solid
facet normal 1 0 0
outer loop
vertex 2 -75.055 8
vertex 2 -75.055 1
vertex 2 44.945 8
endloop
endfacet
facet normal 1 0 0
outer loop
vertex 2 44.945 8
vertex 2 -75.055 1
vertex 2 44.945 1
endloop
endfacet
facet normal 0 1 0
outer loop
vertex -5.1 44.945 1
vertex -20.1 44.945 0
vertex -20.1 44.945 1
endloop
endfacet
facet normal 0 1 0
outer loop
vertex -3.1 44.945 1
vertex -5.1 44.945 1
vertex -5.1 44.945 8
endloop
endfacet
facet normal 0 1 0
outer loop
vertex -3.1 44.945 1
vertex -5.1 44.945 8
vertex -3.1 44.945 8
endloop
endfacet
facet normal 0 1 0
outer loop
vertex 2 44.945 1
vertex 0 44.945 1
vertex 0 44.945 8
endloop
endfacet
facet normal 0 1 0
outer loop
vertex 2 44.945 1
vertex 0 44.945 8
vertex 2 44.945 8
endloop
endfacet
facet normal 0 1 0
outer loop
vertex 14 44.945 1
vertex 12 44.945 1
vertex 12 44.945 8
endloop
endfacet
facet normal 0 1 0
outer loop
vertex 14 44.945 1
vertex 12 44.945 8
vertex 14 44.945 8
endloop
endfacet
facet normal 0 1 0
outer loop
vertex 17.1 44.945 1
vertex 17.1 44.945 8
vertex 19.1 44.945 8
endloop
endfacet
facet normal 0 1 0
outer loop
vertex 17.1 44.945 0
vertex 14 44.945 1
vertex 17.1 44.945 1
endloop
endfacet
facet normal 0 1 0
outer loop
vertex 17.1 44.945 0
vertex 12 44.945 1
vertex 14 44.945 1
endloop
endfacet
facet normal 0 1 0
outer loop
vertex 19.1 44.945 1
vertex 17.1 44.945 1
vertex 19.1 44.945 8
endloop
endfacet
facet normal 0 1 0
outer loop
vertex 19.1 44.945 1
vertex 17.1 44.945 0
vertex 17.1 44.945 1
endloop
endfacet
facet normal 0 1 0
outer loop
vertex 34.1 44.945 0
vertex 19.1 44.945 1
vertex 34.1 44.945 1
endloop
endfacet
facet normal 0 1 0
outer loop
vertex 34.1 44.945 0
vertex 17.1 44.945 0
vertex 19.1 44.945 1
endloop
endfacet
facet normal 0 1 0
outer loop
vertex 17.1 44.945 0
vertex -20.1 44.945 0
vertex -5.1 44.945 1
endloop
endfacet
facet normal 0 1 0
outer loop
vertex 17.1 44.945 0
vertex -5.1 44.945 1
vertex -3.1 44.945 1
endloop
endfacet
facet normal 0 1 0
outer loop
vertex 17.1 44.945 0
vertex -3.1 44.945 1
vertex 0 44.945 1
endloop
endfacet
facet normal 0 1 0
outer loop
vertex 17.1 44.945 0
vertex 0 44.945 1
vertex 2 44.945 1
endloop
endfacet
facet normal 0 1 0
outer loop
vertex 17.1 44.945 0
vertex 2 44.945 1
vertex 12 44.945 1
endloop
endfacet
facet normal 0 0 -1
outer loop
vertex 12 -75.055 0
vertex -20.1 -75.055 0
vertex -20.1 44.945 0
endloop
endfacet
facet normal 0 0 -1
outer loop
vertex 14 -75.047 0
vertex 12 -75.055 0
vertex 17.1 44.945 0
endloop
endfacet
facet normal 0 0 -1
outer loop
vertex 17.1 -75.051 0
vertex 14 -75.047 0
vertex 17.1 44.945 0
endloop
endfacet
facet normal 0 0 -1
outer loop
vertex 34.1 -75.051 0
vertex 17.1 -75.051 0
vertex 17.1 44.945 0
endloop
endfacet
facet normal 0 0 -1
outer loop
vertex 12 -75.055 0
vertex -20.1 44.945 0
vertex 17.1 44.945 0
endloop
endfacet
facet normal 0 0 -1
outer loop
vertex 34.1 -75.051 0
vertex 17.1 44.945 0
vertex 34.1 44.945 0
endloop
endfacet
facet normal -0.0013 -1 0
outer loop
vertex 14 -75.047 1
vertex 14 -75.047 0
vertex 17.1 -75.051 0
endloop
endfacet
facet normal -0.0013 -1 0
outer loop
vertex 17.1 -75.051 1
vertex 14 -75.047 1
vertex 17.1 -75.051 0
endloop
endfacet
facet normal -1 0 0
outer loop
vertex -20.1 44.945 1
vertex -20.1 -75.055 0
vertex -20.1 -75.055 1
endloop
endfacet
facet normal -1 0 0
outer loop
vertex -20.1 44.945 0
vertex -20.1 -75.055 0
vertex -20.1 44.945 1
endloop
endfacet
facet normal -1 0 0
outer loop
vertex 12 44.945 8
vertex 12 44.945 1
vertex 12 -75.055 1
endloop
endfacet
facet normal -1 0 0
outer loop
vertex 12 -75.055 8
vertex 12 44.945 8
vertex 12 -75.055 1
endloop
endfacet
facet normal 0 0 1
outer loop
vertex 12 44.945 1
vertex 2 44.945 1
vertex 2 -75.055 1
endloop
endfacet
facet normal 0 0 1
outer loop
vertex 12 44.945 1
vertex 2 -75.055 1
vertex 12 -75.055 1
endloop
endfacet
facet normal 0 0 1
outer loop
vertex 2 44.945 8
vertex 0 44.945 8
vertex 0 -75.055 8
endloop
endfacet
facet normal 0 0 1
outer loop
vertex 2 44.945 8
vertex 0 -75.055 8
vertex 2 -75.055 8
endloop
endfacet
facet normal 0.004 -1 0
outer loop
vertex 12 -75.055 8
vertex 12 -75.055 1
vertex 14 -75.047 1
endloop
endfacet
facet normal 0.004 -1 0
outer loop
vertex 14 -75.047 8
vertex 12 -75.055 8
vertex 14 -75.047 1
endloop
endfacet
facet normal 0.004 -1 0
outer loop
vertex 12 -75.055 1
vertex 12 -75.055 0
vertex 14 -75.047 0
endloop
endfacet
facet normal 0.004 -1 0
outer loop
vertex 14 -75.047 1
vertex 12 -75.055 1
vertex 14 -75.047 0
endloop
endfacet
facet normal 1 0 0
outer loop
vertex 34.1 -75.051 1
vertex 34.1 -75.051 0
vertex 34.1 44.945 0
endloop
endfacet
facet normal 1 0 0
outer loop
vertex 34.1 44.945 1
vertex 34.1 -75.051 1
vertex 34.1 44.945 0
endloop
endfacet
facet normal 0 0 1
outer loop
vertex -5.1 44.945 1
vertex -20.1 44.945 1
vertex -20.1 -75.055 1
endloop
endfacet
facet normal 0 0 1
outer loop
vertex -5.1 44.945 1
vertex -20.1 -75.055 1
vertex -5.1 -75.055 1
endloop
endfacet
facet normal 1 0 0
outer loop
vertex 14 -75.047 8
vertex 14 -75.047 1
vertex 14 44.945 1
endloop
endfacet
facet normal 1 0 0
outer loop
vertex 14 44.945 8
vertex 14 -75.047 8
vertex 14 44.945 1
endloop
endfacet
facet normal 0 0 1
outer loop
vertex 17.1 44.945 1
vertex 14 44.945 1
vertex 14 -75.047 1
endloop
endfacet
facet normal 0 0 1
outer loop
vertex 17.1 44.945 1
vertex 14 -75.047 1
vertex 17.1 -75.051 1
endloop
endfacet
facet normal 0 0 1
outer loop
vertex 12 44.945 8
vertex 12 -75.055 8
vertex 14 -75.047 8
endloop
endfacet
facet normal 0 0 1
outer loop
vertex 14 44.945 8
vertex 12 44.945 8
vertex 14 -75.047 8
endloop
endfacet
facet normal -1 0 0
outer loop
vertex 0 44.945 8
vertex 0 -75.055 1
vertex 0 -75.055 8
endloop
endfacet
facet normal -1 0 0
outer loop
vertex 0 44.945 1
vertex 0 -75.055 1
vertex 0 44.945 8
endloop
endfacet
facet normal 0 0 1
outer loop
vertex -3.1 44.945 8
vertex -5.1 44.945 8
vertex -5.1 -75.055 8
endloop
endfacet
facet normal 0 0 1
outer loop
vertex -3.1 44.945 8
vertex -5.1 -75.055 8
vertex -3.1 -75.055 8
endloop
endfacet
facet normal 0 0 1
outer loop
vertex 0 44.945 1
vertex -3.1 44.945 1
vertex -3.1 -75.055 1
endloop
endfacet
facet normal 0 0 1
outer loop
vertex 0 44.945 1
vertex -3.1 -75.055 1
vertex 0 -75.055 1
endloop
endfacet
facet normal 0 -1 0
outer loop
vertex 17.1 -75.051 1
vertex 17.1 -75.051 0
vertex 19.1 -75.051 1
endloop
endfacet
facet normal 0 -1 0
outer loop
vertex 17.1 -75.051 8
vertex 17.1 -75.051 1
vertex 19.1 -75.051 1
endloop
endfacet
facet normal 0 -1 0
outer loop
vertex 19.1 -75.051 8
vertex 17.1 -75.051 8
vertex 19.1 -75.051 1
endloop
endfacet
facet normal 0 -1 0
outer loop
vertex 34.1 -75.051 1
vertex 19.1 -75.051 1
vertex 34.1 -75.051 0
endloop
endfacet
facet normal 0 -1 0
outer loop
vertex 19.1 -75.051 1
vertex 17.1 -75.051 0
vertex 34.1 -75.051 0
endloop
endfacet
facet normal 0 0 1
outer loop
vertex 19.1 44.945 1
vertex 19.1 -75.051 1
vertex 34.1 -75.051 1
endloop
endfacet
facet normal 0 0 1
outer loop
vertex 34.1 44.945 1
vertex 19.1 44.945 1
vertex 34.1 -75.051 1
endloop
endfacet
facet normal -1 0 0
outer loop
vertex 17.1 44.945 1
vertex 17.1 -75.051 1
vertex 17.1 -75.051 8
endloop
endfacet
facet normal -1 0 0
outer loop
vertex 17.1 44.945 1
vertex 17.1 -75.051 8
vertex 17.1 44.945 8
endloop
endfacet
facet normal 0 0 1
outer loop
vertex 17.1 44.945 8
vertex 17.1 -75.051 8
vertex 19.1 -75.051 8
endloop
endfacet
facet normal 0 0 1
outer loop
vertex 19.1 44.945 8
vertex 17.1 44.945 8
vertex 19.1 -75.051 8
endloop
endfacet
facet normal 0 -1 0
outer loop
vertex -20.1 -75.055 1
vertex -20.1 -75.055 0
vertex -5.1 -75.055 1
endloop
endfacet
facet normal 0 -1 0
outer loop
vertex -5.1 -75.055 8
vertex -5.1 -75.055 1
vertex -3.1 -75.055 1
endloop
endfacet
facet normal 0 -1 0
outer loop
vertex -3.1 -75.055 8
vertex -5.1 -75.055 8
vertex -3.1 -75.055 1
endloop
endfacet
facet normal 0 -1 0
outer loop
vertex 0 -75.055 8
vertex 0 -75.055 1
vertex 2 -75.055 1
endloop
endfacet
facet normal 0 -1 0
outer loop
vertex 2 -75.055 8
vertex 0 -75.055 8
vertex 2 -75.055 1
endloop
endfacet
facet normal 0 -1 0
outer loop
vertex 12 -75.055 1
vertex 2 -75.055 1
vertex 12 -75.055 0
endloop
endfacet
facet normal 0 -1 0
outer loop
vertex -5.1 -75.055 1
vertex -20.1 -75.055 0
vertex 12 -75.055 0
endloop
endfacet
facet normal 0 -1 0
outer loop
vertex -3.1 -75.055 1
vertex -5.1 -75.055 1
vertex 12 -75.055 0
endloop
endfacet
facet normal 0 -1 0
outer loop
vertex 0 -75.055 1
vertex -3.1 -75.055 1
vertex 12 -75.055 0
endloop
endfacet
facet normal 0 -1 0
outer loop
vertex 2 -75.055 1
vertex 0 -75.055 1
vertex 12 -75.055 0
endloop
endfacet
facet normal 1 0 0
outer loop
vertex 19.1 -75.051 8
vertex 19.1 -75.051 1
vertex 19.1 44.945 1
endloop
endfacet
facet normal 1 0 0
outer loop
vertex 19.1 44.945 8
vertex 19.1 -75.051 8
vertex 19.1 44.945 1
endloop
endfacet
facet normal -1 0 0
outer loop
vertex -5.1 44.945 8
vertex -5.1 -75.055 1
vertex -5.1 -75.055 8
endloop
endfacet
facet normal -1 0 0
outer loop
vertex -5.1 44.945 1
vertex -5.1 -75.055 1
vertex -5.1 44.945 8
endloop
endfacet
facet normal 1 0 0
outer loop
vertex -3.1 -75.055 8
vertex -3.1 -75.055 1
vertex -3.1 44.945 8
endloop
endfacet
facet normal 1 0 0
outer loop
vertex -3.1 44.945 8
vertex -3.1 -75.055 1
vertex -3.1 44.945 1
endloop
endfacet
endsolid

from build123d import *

# Parameters (mm, degrees)
F0_W     = 3.1
F0_H     = 120
F1_DEPTH = 1
F0_W_2   = 10
F0_W_3   = 15
F0_H_2   = 119.9958917713
F0_W_4   = 2
F2_DEPTH = 8


with BuildPart() as f1:
    # F0 (on Top) → F1 (new body)
    with BuildSketch(Plane.XY):
        with Locations((-1.55, -15.0552866608)):
            Rectangle(F0_W, F0_H)
    extrude(amount=F1_DEPTH)



with BuildPart() as f1b:
    # F0 (on Top) → F1, piece 2 (new body)
    with BuildSketch(Plane.XY):
        with Locations((7, -15.0552866608)):
            Rectangle(F0_W_2, F0_H)
    extrude(amount=F1_DEPTH)


with BuildPart() as f1c:
    # F0 (on Top) → F1, piece 3 (new body)
    with BuildSketch(Plane.XY):
        with Locations((-12.6, -15.0552866608)):
            Rectangle(F0_W_3, F0_H)
    extrude(amount=F1_DEPTH)


with BuildPart() as f1d:
    # F0 (on Top) → F1, piece 4 (new body)
    with BuildSketch(Plane.XY):
        with Locations((26.6, -15.0532325464)):
            Rectangle(F0_W_3, F0_H_2)
    extrude(amount=F1_DEPTH)


with BuildPart() as f1e:
    # F0 (on Top) → F1, piece 5 (new body)
    with BuildSketch(Plane.XY):
        Polygon((17.1, 44.9447133392), (14, 44.9447133392), (14, -75.0468607033), (17.1, -75.0511784321), align=None)
    extrude(amount=F1_DEPTH)


with BuildPart() as f1_1:
    add(f1.part)

    add(f1b.part)  # F2 merges F1b

    add(f1c.part)  # F2 merges F1c

    add(f1d.part)  # F2 merges F1d

    add(f1e.part)  # F2 merges F1e
    # F0 (on Top) → F2 (join)
    with BuildSketch(Plane.XY):
        with Locations((-4.1, -15.0552866608)):
            Rectangle(F0_W_4, F0_H)
        with Locations((1, -15.0552866608)):
            Rectangle(F0_W_4, F0_H)
        Polygon((14, 44.9447133392), (12, 44.9447133392), (12, -75.0552866608), (14, -75.0468607033), align=None)
        with Locations((18.1, -15.0532325464)):
            Rectangle(F0_W_4, F0_H_2)
    extrude(amount=F2_DEPTH)


solid = f1_1.part
